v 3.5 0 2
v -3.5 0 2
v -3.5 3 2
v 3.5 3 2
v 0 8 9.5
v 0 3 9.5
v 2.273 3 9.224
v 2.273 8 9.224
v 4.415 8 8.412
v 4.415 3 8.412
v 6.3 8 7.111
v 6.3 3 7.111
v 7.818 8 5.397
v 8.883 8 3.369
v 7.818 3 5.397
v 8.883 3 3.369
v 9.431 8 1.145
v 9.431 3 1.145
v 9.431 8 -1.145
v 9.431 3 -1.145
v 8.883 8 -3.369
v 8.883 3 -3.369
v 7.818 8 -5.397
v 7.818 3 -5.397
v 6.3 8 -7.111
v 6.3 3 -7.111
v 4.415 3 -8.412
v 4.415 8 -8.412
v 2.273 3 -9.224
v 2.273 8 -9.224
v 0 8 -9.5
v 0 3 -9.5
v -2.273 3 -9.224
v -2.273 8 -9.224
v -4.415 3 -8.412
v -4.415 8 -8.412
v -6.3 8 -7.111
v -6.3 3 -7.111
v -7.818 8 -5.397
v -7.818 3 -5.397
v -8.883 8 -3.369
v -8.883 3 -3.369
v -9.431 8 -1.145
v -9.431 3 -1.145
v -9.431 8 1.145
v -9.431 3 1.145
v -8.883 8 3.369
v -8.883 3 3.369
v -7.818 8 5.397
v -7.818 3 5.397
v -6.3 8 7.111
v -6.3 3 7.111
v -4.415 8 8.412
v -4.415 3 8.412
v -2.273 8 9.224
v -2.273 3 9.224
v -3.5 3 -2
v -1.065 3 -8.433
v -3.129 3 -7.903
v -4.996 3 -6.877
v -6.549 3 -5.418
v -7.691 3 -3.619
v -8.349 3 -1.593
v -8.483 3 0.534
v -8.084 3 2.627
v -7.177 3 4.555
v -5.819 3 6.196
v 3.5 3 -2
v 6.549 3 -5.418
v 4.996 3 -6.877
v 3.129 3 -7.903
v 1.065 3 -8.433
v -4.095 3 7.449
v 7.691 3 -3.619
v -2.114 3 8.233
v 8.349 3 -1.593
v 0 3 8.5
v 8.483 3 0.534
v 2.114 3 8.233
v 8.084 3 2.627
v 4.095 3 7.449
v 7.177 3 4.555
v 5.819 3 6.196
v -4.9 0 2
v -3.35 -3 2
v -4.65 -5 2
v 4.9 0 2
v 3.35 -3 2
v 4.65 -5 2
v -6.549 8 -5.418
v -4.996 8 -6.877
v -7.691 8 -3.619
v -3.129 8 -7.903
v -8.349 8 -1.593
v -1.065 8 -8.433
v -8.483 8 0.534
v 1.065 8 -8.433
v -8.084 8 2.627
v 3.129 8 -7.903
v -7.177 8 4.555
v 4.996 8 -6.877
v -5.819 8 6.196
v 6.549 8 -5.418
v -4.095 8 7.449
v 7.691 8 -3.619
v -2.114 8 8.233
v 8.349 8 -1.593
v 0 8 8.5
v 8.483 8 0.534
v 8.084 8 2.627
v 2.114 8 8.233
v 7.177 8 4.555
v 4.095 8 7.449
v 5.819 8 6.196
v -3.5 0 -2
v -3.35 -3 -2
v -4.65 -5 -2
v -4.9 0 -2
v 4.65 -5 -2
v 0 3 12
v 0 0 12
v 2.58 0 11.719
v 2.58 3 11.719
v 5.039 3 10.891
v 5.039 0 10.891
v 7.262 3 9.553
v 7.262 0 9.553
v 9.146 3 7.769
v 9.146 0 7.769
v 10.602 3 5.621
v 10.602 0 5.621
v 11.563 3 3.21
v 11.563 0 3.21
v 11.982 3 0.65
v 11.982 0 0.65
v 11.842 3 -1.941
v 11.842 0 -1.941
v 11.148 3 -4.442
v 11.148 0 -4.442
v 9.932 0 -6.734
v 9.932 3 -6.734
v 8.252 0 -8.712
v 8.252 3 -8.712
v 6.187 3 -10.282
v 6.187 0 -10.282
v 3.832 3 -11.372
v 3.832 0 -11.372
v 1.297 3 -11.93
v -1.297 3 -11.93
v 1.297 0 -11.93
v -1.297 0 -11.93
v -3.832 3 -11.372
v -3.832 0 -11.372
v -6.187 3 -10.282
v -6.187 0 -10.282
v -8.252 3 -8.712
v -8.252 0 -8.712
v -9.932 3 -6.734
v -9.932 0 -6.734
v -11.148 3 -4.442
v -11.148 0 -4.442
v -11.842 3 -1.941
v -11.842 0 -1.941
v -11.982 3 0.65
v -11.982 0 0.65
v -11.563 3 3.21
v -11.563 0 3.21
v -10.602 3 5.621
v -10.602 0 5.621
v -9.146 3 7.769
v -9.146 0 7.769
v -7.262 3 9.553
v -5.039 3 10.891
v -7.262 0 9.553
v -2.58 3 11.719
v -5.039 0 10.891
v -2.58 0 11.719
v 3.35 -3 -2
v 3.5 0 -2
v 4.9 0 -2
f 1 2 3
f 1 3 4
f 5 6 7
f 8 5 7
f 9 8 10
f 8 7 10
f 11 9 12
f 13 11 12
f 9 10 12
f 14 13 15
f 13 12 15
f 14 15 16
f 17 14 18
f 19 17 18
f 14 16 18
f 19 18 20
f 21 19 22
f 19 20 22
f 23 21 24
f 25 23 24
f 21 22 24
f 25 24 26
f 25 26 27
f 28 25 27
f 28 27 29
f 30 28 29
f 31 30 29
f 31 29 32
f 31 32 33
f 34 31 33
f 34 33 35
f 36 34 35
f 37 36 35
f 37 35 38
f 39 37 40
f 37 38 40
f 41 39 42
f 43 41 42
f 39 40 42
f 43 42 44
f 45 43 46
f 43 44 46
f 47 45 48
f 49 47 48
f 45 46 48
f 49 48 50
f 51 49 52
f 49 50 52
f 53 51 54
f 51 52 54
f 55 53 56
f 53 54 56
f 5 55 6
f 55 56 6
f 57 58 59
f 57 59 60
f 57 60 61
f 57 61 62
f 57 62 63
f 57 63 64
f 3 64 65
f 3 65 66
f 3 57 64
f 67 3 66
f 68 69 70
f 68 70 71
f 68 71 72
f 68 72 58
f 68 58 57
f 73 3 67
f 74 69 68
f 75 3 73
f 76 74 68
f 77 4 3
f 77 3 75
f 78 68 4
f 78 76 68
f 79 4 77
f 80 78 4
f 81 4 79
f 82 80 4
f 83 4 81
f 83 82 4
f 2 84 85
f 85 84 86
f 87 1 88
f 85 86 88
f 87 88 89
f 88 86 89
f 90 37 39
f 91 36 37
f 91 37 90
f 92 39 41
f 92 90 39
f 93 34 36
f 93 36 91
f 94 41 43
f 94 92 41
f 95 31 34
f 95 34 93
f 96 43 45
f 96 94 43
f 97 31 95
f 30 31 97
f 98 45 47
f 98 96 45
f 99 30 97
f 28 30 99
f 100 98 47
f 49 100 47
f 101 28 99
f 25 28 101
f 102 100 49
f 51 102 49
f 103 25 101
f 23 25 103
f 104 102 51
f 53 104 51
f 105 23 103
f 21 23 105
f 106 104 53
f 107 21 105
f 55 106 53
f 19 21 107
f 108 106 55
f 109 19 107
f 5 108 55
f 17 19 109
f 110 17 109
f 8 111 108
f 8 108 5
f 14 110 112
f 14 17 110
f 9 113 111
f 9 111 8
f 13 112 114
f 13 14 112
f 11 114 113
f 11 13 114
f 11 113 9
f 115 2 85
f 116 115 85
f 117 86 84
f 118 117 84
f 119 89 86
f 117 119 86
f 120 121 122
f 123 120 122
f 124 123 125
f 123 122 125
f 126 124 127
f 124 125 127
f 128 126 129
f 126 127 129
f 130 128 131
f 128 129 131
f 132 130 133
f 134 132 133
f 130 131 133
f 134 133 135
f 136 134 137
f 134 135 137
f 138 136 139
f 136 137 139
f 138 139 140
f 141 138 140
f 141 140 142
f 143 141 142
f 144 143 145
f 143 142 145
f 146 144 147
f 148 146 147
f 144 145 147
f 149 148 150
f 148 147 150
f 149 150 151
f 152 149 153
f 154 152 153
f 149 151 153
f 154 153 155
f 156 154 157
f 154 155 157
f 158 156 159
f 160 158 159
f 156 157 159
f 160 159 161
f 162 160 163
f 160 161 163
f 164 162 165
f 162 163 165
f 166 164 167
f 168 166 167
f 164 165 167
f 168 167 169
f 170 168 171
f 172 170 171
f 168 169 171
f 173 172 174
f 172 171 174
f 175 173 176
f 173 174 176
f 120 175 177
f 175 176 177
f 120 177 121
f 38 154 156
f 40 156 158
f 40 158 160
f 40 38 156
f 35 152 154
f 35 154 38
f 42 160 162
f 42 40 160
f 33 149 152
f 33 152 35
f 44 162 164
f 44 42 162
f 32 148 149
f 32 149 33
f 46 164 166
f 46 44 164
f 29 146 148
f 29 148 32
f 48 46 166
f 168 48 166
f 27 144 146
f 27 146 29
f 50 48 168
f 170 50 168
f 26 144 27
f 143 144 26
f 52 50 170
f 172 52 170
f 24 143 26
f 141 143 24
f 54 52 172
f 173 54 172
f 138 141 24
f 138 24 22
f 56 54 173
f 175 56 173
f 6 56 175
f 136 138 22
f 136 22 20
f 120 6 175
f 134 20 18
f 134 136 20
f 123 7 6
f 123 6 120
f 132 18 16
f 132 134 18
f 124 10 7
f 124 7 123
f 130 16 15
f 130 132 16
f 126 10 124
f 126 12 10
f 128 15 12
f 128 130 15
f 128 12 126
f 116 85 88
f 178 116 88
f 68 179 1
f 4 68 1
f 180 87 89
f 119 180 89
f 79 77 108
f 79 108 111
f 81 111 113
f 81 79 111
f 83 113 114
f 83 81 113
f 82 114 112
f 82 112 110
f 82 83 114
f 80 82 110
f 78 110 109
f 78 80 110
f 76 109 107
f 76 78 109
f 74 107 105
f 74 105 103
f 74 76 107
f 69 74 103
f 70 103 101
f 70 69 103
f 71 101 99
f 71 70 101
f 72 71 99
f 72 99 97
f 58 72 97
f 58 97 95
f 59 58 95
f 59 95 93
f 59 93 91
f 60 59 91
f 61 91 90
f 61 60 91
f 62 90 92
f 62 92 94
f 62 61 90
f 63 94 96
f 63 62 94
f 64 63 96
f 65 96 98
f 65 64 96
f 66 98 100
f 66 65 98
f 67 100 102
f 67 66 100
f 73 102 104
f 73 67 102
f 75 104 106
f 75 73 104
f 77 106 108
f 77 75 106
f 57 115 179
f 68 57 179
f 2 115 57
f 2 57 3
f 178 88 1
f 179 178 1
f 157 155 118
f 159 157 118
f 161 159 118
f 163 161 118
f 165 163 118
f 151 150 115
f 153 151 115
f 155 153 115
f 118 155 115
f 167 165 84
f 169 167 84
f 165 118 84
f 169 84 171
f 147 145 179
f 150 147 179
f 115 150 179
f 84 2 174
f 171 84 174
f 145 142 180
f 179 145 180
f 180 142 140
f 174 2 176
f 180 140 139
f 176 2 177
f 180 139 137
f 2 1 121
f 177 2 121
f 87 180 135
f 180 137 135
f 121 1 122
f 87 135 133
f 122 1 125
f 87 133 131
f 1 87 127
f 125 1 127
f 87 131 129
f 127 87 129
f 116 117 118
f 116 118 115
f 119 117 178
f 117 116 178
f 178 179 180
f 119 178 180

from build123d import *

# Parameters (mm, degrees)
PROFILES_R                  = 12
PROFILE_DEPTH               = 3
CONNECTINGWALLS_R           = 9.5
CONNECTINGWALLS_R_2         = 8.5
CONNECTINGWALL_DEPTH        = 5
CONNECTORCUTS_W             = 7
CONNECTORCUTS_H             = 4
CONNECTORCUT_DEPTH          = 19.761663039
CONNECTOR_REACH             = 20.762
CONNECTOR_DIRECTION_2_REACH = 20.762


with BuildPart() as part:
    # ProfileS → Profile (new body)
    with BuildSketch(Plane(origin=(0, 0, 0), x_dir=(1, 0, 0), z_dir=(0, 1, 0))):
        Circle(PROFILES_R)
    extrude(amount=PROFILE_DEPTH)

    # ConnectingWallS → ConnectingWall (add)
    with BuildSketch(Plane(origin=(0, 3, 0), x_dir=(1, 0, 0), z_dir=(0, 1, 0))):
        Circle(CONNECTINGWALLS_R)
        Circle(CONNECTINGWALLS_R_2, mode=Mode.SUBTRACT)
    extrude(amount=CONNECTINGWALL_DEPTH)

    # ConnectorCutS → ConnectorCut (cut, through all)
    with BuildSketch(Plane.XZ):
        Rectangle(CONNECTORCUTS_W, CONNECTORCUTS_H)
    extrude(amount=-CONNECTORCUT_DEPTH, mode=Mode.SUBTRACT)

    # Connector: up to this face of the body (flat: up to its plane)
    connector_end = Plane(part.part.faces().sort_by_distance((0, 1.5, 2))[0])
    # ConnectorS → Connector (add, up to the picked face)
    with BuildSketch(Plane.XY, mode=Mode.PRIVATE) as connector_sk1:
        Polygon((-3.5, 0), (-3.35, -3), (3.35, -3), (3.5, 0), (4.9, 0), (4.65, -5), (-4.65, -5), (-4.9, 0), align=None)
    connector_tool1 = split(extrude(connector_sk1.sketch, amount=CONNECTOR_REACH, mode=Mode.PRIVATE), bisect_by=connector_end, keep=Keep.BOTH, mode=Mode.PRIVATE)
    add(connector_tool1.solids().sort_by(Axis((0, -3.22549, 0), (0, 0, 1)))[0])

    # Connector direction 2: up to this face of the body (flat: up to its plane)
    connector_direction_2_end = Plane(part.part.faces().sort_by_distance((0, 1.5, -2))[0])
    # ConnectorS → Connector direction 2 (add, up to the picked face)
    with BuildSketch(Plane.XY, mode=Mode.PRIVATE) as connector_direction_2_sk1:
        Polygon((-3.5, 0), (-3.35, -3), (3.35, -3), (3.5, 0), (4.9, 0), (4.65, -5), (-4.65, -5), (-4.9, 0), align=None)
    connector_direction_2_tool1 = split(extrude(connector_direction_2_sk1.sketch, amount=-CONNECTOR_DIRECTION_2_REACH, mode=Mode.PRIVATE), bisect_by=connector_direction_2_end, keep=Keep.BOTH, mode=Mode.PRIVATE)
    add(connector_direction_2_tool1.solids().sort_by(Axis((0, -3.22549, 0), (0, 0, -1)))[0])


solid = part.part
